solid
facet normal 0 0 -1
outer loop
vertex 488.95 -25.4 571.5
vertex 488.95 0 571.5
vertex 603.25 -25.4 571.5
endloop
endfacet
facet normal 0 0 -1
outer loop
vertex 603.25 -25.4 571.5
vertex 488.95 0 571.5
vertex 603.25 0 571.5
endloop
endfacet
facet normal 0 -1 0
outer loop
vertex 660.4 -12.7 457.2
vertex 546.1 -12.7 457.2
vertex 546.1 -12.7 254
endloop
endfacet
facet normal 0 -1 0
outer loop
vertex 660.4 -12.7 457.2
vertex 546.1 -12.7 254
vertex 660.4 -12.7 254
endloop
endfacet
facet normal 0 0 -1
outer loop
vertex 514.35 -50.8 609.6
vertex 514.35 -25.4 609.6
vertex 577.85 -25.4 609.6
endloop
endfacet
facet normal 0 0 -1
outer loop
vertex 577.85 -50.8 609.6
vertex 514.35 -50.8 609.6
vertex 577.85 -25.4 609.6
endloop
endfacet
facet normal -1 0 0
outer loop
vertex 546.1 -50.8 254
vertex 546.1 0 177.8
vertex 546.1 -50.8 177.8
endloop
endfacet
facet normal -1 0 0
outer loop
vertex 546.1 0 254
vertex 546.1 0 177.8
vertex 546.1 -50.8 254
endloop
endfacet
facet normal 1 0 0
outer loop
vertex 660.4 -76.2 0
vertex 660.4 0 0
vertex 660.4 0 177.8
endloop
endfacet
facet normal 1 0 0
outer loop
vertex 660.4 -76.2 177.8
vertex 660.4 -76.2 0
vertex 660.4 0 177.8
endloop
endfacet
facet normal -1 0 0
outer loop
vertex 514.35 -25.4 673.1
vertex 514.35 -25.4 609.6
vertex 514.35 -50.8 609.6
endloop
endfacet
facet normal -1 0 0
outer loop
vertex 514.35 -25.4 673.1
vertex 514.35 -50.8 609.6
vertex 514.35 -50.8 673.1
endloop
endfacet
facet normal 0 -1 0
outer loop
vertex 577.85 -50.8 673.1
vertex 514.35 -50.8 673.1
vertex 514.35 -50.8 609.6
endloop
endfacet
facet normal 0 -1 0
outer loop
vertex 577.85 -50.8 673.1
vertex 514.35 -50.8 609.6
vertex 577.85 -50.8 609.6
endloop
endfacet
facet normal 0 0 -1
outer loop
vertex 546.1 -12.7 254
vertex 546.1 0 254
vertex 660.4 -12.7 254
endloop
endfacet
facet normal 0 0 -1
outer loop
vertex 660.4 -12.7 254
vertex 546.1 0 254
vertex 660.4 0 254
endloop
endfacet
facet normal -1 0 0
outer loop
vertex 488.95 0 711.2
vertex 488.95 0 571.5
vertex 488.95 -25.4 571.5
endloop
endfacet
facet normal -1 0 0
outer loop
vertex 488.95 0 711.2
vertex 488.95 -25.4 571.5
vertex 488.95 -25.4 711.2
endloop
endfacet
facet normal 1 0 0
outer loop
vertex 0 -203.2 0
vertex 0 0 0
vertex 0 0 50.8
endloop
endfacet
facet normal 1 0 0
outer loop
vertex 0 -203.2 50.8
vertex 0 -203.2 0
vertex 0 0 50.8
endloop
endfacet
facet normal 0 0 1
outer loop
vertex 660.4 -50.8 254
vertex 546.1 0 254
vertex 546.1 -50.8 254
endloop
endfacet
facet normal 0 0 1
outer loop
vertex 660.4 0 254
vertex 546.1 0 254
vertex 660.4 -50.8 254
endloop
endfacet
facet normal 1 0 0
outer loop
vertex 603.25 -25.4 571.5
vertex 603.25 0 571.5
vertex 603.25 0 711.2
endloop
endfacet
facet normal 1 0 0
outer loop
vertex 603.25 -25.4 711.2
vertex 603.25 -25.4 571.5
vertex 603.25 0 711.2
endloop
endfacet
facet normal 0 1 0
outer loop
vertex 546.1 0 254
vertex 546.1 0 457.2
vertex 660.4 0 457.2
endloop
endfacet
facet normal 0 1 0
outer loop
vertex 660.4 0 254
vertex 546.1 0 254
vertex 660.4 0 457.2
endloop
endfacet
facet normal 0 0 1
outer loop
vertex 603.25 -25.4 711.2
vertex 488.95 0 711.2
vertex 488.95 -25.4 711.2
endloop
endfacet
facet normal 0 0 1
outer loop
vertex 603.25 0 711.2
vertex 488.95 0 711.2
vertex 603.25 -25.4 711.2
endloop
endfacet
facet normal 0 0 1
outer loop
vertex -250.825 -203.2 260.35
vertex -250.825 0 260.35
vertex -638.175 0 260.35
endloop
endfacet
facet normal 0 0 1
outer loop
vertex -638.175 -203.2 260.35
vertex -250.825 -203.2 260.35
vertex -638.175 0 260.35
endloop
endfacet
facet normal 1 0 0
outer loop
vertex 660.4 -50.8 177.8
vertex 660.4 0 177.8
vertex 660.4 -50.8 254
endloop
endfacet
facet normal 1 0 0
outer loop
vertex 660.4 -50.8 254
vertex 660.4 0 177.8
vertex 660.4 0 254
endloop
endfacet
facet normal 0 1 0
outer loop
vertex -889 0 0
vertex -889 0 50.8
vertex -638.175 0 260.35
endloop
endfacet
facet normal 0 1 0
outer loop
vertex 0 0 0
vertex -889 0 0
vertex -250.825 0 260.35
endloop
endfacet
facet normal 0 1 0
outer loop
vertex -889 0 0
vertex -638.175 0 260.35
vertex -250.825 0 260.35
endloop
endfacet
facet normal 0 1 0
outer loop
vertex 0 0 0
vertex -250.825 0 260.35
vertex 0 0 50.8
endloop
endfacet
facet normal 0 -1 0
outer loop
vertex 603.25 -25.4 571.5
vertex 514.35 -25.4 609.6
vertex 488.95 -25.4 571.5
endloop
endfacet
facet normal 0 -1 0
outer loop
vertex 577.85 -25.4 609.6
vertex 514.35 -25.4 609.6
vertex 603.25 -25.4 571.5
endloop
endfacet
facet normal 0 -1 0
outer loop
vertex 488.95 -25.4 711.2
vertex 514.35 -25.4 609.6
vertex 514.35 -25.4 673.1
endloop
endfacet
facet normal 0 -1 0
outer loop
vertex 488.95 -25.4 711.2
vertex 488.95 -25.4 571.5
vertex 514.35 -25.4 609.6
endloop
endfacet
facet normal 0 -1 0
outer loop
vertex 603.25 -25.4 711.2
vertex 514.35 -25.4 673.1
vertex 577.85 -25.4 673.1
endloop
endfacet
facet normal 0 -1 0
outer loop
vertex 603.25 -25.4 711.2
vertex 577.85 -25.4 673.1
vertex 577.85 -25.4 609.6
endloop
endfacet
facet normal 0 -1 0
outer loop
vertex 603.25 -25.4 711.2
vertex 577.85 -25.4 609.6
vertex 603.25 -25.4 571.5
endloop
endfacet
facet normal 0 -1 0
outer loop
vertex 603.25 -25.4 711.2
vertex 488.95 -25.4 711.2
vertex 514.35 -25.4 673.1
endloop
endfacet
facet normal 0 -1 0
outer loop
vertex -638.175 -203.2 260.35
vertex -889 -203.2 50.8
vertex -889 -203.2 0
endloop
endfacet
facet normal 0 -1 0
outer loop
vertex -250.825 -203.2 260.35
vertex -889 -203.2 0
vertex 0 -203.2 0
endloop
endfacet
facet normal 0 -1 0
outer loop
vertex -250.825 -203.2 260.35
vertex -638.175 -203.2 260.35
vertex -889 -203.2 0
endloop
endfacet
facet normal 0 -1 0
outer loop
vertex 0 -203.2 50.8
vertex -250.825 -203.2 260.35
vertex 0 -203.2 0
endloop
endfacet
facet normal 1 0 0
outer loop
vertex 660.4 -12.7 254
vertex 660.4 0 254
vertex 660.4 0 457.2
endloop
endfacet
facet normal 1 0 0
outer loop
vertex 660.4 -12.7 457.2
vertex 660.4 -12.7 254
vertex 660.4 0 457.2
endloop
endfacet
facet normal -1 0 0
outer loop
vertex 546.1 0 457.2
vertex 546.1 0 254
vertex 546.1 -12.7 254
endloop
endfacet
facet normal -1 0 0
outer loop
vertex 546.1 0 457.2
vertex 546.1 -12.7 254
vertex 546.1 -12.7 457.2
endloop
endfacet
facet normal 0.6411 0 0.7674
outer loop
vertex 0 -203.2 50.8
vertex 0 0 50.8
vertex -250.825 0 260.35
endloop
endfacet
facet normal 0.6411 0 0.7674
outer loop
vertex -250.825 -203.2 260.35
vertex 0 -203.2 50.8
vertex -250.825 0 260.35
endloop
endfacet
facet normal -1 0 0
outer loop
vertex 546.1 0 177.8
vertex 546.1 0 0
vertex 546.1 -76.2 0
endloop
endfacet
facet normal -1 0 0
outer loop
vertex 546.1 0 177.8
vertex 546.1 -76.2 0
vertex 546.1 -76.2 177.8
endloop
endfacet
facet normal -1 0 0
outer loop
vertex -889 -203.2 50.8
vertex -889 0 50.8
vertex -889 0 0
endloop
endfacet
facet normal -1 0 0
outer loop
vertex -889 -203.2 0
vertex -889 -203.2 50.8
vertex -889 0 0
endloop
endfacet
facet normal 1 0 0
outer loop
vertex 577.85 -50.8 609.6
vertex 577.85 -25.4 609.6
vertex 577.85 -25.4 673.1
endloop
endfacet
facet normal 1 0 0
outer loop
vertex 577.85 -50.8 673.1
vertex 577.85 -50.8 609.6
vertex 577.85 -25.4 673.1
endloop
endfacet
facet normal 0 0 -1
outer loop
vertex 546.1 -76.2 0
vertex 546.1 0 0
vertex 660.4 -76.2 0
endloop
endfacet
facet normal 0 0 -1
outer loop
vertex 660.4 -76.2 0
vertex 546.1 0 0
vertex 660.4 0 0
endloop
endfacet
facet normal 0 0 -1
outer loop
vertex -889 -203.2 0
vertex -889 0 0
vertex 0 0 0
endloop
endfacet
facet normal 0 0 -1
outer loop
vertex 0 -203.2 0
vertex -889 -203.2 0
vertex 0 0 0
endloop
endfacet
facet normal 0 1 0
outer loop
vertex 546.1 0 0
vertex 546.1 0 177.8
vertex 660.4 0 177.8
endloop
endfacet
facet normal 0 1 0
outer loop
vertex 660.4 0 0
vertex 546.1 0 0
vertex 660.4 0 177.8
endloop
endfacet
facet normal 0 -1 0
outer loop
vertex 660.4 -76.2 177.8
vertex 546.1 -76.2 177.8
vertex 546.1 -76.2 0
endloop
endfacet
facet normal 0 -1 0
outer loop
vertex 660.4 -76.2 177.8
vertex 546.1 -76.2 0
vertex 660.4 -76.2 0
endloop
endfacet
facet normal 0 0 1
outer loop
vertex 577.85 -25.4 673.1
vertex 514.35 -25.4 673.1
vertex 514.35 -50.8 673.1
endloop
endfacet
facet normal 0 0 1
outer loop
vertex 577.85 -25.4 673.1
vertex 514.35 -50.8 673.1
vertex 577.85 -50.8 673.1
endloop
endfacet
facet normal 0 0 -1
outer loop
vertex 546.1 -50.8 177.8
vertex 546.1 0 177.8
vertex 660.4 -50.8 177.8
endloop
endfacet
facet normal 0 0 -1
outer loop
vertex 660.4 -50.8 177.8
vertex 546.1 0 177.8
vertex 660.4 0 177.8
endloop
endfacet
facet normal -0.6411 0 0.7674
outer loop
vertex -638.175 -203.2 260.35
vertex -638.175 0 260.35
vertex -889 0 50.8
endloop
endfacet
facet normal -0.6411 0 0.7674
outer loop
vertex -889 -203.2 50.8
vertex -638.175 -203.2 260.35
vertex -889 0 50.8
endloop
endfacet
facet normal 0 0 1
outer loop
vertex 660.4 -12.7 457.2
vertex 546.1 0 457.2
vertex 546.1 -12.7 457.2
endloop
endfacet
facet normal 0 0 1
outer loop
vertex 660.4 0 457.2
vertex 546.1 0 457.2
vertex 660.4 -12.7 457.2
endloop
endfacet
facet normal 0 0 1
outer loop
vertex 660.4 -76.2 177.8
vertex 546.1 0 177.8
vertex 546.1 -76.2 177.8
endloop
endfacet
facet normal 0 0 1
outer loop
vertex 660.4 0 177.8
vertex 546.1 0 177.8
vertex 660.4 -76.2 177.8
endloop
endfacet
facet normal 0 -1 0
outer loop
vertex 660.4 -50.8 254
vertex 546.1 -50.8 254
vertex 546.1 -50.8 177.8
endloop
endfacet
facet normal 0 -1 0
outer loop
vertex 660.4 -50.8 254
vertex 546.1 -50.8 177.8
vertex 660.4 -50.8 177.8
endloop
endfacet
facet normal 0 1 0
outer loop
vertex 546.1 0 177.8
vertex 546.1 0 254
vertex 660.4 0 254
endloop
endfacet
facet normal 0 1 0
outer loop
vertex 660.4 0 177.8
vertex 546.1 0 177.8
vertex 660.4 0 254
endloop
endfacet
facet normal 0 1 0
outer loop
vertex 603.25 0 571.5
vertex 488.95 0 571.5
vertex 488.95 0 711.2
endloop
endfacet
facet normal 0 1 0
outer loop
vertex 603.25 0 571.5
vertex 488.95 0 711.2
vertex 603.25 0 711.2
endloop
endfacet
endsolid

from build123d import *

# Parameters (mm, degrees)
F2_DEPTH = 203.2
F1_W     = 114.3
F1_H     = 177.8
F3_DEPTH = 76.2
F1_H_2   = 203.2
F4_DEPTH = 12.7
F1_H_3   = 76.2
F5_DEPTH = 50.8
F1_H_4   = 139.7
F1_W_2   = 63.5
F1_H_5   = 63.5
F6_DEPTH = 25.4
F7_DEPTH = 50.8


with BuildPart() as f2:
    # F1 (on Front) → F2 (new body)
    with BuildSketch(Plane.XZ):
        Polygon((-250.825, 0), (0, 0), (0, 50.8), (-250.825, 260.35), (-638.175, 260.35), (-889, 50.8), (-889, 0), (-638.175, 0), align=None)
    extrude(amount=F2_DEPTH)


with BuildPart() as f3:
    # F1 (on Front) → F3 (new body)
    with BuildSketch(Plane.XZ):
        with Locations((603.25, 88.9)):
            Rectangle(F1_W, F1_H)
    extrude(amount=F3_DEPTH)


with BuildPart() as f4:
    # F1 (on Front) → F4 (new body)
    with BuildSketch(Plane.XZ):
        with Locations((603.25, 355.6)):
            Rectangle(F1_W, F1_H_2)
    extrude(amount=F4_DEPTH)


with BuildPart() as f5:
    # F1 (on Front) → F5 (new body)
    with BuildSketch(Plane.XZ):
        with Locations((603.25, 215.9)):
            Rectangle(F1_W, F1_H_3)
    extrude(amount=F5_DEPTH)


with BuildPart() as f6:
    # F1 (on Front) → F6 (new body)
    with BuildSketch(Plane.XZ):
        with Locations((546.1, 641.35)):
            Rectangle(F1_W, F1_H_4)
        with Locations((546.1, 641.35)):
            Rectangle(F1_W_2, F1_H_5, mode=Mode.SUBTRACT)
    extrude(amount=F6_DEPTH)

    # F1 (on Front) → F7 (join)
    with BuildSketch(Plane.XZ):
        with Locations((546.1, 641.35)):
            Rectangle(F1_W_2, F1_H_5)
    extrude(amount=F7_DEPTH)


solid = Compound([f2.part, f3.part, f4.part, f5.part, f6.part])
